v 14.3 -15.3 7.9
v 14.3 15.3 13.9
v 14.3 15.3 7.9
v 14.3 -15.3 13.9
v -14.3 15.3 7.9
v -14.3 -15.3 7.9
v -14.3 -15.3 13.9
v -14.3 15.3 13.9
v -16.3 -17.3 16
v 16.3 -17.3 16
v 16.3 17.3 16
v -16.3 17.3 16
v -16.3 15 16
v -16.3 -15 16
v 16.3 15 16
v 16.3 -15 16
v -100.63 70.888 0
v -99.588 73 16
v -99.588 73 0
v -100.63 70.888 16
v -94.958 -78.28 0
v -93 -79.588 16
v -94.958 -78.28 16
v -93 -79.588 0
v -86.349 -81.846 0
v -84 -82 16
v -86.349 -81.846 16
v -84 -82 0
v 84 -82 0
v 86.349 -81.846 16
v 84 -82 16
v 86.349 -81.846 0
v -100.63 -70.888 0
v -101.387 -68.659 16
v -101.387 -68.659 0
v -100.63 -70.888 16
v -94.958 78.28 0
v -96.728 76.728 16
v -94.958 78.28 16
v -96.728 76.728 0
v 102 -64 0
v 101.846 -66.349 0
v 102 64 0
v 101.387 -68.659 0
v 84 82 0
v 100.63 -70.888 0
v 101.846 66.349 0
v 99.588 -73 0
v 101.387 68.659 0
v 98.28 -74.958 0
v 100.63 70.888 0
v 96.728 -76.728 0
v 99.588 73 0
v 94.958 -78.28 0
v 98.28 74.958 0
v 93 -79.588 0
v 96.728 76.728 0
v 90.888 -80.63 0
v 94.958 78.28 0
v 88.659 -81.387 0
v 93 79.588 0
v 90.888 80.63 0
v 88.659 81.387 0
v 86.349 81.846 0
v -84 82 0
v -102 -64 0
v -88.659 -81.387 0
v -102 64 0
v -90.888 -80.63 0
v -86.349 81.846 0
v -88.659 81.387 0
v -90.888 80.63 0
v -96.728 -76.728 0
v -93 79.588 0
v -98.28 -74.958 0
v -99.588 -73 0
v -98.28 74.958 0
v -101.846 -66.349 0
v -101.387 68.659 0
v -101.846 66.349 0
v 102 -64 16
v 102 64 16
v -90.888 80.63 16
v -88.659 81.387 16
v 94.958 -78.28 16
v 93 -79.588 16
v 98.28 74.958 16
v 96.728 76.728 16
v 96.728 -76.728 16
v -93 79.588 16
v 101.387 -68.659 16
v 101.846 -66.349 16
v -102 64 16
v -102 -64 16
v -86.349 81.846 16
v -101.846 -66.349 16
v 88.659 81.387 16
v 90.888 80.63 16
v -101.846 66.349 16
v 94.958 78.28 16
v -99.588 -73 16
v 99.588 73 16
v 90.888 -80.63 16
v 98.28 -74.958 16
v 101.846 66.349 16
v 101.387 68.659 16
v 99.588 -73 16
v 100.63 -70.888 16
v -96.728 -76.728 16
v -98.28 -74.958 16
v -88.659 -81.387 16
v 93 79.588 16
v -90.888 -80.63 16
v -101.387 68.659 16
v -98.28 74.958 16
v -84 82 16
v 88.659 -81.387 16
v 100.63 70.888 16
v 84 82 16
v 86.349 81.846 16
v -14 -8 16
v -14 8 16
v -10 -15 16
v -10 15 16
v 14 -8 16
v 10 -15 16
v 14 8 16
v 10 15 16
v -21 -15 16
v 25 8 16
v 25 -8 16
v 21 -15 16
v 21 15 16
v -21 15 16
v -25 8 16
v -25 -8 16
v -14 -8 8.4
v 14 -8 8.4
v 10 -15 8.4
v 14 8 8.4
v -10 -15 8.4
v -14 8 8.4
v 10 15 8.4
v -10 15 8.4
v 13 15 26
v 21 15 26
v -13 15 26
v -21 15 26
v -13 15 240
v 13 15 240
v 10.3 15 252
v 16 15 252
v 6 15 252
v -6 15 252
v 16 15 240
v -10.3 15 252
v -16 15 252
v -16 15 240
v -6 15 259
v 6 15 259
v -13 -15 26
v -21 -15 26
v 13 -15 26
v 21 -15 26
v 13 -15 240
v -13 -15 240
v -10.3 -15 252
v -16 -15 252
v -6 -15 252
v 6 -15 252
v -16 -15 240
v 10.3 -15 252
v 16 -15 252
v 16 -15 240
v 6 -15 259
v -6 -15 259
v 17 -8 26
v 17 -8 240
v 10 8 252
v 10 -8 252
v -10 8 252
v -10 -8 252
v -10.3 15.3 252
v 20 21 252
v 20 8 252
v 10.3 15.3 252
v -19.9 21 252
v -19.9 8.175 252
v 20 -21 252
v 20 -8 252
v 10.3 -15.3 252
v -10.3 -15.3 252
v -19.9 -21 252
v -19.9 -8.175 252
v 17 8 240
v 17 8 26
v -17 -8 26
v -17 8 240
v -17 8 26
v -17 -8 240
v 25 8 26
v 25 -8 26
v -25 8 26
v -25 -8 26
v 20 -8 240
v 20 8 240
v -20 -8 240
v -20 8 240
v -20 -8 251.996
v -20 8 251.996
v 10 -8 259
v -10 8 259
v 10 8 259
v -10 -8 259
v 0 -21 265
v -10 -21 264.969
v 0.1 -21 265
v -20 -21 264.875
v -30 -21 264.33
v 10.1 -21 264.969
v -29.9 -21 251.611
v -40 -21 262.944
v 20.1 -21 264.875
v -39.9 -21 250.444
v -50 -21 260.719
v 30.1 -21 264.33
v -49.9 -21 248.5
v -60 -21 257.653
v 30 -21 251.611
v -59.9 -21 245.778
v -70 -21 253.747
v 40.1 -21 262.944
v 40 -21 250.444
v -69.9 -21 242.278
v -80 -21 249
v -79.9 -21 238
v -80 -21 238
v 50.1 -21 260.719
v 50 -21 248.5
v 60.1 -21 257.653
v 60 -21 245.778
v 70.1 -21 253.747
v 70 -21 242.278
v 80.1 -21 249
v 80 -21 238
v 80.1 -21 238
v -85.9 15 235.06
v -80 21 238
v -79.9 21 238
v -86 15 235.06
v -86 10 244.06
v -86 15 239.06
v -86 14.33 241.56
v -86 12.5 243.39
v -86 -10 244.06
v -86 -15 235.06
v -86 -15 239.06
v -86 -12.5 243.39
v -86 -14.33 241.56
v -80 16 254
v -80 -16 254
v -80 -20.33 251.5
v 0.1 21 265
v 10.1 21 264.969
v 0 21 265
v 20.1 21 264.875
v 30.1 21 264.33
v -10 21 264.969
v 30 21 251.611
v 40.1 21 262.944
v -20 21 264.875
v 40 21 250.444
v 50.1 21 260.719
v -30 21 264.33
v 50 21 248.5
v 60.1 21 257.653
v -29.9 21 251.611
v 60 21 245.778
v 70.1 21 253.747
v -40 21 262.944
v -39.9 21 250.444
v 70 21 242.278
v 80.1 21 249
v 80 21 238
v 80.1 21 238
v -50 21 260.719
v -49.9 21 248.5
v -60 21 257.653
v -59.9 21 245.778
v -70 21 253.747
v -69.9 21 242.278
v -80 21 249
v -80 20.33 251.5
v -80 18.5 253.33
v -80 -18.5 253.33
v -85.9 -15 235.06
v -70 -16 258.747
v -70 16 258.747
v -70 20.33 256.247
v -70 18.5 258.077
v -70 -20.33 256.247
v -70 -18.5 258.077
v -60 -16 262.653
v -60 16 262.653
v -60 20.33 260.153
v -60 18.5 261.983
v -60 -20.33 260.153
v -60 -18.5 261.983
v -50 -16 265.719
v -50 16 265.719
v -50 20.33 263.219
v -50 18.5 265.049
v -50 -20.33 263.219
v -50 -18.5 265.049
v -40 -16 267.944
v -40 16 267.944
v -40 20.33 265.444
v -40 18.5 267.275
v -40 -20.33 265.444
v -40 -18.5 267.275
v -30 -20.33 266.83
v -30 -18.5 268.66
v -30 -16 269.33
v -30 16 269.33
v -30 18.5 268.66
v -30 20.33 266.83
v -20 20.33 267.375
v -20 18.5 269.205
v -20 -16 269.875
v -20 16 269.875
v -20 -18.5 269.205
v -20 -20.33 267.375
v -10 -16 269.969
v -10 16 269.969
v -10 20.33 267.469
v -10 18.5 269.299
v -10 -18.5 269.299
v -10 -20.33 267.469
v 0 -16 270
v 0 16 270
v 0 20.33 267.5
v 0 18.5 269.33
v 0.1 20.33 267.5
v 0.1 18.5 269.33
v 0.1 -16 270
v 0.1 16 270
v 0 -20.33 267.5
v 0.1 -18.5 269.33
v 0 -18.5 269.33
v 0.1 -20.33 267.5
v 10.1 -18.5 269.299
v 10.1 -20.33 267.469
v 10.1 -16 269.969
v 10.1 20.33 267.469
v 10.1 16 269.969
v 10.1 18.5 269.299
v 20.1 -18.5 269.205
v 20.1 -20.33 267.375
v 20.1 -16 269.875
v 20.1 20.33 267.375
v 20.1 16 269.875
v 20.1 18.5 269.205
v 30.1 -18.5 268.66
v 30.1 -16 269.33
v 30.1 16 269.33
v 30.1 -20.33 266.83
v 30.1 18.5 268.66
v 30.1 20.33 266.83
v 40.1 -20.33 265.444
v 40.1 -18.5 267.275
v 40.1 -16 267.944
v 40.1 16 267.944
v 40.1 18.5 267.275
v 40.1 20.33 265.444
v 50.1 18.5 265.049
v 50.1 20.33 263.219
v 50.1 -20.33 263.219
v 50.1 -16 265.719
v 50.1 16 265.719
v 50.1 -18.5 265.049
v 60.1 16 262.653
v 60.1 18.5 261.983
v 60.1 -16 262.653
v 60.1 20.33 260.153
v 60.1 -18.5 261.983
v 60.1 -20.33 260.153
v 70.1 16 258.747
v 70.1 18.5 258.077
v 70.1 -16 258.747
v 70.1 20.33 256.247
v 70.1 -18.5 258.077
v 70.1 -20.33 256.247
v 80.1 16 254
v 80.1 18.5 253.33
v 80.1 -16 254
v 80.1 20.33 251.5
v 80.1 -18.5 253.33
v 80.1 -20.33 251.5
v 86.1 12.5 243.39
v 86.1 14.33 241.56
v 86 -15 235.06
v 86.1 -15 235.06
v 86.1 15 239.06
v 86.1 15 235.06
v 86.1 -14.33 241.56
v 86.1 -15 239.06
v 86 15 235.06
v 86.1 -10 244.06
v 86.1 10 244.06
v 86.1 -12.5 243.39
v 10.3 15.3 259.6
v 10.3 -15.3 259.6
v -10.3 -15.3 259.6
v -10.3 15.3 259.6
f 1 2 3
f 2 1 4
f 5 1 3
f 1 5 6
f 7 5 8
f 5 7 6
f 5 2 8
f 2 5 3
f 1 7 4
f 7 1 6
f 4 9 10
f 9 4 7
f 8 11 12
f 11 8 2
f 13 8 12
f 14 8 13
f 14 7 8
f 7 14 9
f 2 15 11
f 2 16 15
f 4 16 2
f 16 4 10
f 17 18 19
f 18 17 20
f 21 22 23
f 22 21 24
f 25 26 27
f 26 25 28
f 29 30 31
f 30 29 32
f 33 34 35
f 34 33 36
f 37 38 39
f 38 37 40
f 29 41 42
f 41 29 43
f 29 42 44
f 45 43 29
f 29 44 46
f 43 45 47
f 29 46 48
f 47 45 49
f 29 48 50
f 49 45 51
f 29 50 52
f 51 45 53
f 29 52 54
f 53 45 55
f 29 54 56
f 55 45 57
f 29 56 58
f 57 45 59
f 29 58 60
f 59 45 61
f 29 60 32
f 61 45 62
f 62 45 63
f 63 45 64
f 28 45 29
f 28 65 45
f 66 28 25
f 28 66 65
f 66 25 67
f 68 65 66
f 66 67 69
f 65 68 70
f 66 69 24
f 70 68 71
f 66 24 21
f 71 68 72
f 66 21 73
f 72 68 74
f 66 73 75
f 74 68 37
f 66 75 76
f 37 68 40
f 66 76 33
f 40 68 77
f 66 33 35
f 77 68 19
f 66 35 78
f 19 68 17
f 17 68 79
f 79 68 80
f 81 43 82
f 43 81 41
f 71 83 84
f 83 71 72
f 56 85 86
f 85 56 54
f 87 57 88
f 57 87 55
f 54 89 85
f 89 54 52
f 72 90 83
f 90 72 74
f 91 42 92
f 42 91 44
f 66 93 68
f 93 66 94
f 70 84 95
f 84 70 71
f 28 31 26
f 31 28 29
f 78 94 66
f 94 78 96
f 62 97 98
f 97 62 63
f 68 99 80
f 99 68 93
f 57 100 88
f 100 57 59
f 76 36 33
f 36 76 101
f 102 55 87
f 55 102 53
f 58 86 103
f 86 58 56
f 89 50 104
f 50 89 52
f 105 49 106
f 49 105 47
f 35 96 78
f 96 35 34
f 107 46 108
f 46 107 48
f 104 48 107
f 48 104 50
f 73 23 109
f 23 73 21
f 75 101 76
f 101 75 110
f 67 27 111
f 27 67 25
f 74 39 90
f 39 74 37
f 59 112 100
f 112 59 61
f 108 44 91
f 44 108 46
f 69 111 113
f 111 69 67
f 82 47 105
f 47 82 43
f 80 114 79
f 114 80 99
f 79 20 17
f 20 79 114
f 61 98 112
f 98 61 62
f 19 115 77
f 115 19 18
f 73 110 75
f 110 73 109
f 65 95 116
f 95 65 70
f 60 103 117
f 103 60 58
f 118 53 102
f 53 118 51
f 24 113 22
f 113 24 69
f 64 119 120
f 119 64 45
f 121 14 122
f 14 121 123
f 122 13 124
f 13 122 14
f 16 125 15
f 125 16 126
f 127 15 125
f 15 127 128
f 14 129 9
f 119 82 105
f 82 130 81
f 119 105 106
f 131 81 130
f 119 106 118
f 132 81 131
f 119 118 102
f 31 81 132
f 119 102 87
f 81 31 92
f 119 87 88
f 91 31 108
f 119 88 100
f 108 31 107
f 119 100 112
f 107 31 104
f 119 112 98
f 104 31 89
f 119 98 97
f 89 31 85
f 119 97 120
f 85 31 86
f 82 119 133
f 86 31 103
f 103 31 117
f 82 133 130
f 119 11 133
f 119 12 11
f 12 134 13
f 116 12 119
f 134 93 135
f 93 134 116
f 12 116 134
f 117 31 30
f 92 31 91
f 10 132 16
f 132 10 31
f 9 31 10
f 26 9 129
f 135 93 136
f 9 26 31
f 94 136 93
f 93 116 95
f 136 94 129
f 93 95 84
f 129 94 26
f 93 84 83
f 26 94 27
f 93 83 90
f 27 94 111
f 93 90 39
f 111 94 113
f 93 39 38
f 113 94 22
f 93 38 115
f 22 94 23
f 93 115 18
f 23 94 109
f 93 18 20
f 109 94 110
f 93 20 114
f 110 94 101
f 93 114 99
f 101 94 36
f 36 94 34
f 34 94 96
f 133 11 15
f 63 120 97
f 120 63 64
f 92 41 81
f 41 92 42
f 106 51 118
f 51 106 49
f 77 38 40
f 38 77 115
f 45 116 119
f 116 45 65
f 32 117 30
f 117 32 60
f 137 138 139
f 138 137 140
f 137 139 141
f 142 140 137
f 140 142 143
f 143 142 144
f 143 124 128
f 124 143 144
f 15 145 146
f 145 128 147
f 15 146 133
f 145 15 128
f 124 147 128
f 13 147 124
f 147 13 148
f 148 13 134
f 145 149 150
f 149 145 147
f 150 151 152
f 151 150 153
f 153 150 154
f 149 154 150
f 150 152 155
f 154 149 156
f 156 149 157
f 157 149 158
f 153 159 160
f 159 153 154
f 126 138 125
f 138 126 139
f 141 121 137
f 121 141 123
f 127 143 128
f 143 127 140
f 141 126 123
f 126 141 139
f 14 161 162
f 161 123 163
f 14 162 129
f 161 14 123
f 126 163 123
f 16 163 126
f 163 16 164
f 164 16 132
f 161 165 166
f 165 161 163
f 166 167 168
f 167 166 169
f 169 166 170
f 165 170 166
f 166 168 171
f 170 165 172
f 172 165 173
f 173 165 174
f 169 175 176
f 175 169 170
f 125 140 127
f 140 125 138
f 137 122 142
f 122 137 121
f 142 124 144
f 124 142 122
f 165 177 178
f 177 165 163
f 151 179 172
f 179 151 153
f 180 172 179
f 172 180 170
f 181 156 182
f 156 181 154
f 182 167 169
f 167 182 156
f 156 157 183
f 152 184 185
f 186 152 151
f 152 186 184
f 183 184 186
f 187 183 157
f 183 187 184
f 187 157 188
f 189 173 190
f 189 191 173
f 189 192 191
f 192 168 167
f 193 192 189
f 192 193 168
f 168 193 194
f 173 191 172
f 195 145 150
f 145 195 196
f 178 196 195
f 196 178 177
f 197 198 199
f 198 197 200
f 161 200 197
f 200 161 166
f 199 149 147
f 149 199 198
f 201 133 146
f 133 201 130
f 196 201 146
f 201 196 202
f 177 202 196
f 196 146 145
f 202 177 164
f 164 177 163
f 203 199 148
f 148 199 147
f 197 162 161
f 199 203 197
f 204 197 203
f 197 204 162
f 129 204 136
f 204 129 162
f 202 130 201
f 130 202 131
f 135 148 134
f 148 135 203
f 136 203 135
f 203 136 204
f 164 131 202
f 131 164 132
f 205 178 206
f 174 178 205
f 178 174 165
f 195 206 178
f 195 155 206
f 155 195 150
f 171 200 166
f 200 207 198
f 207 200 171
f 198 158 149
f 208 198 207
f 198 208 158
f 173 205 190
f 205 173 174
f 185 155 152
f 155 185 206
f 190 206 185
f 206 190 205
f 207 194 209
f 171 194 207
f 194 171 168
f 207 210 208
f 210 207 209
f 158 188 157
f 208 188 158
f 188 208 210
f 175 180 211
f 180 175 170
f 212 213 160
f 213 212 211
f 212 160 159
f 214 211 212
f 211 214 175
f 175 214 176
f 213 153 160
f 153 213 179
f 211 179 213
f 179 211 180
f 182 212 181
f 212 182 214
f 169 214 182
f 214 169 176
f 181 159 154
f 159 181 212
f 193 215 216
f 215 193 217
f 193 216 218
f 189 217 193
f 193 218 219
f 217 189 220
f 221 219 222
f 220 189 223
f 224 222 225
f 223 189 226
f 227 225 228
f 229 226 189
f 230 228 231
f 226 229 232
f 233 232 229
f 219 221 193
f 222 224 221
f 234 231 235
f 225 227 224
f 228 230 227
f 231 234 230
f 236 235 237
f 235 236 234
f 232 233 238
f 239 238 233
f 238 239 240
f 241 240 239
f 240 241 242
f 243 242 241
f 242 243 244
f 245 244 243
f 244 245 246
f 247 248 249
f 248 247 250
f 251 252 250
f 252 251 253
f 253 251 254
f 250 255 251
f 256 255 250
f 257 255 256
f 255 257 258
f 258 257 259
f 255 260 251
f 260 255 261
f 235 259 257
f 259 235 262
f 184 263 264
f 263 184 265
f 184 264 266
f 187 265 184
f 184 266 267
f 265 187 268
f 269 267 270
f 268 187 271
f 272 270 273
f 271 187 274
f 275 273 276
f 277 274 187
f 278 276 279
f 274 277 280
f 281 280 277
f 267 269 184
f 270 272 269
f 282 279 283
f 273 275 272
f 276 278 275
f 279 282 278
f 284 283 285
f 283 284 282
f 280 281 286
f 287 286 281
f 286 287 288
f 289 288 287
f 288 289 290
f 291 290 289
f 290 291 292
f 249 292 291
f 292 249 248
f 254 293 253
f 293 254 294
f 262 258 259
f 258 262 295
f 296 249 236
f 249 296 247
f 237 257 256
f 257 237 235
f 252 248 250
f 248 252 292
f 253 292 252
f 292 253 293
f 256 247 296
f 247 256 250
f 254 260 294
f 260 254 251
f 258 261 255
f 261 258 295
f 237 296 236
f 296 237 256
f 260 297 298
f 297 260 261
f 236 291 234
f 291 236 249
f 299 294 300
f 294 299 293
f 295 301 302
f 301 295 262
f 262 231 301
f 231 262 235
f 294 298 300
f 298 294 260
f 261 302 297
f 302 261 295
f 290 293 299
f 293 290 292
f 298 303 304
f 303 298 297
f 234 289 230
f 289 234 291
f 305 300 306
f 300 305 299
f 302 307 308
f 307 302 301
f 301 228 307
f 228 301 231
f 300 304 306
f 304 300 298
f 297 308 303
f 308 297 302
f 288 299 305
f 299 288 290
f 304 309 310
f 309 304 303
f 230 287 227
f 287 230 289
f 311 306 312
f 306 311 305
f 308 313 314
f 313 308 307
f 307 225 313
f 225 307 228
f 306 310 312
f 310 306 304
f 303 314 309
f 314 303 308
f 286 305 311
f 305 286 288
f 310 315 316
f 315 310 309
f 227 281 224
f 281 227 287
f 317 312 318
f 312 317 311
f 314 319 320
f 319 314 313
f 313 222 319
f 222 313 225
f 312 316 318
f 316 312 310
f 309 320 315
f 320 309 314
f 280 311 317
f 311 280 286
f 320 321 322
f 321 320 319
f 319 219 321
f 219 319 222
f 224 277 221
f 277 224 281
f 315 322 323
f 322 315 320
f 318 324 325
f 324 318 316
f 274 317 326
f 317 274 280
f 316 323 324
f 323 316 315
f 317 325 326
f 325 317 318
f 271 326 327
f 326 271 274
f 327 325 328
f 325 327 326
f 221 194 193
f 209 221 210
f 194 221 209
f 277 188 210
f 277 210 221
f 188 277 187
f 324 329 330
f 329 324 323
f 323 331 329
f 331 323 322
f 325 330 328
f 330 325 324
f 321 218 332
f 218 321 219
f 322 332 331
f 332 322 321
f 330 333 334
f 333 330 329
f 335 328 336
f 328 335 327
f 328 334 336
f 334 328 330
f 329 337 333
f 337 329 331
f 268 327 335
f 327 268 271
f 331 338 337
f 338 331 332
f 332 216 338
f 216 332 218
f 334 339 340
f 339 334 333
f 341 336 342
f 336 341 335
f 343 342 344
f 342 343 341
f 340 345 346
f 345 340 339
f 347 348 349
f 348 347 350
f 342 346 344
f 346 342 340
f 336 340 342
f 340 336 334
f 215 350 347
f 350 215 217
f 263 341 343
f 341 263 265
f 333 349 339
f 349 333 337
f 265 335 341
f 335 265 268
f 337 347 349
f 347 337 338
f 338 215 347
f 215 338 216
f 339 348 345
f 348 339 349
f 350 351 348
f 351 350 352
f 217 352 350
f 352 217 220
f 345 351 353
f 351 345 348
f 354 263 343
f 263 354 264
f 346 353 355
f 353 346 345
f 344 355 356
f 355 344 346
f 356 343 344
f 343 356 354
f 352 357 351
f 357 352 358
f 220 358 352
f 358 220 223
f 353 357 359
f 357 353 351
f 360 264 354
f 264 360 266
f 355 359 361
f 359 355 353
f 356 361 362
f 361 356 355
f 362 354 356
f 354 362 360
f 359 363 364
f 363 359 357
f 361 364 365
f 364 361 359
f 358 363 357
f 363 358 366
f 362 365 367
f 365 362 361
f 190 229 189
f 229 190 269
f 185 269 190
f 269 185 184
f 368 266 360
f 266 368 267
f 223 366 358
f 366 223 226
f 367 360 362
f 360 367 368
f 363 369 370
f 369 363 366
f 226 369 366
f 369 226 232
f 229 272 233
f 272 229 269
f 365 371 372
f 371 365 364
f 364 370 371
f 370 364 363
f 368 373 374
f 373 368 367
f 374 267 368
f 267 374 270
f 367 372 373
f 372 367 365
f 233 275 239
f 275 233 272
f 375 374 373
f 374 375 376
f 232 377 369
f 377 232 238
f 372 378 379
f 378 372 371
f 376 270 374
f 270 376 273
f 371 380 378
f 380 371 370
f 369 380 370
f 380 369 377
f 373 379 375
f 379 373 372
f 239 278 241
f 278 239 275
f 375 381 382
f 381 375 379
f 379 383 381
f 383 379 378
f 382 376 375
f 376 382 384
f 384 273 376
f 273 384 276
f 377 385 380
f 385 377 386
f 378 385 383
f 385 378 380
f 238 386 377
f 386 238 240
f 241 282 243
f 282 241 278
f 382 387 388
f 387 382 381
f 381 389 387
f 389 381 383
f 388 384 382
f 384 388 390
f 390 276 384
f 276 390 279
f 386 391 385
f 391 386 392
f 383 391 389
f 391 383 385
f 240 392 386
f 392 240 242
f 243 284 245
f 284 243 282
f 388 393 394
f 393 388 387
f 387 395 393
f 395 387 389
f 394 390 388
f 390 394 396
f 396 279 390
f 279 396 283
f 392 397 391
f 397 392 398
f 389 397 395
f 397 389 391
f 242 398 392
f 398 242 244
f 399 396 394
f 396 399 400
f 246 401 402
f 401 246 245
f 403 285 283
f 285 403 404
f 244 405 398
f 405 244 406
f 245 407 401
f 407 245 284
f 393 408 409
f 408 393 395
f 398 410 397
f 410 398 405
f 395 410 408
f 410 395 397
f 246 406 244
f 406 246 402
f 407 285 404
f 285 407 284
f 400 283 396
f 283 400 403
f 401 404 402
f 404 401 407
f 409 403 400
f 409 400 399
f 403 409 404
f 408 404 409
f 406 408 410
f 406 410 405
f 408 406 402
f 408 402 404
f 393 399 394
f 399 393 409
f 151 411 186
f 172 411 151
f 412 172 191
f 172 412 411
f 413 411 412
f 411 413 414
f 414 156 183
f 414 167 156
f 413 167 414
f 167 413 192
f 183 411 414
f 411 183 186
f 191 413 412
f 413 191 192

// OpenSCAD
// Headphone stand in three printed parts: base, post and hanger.
// No glue and no screws. Rectangular (non-round) tenons prevent rotation.
// Units: mm. Printed in PLA, 0.4 mm nozzle, no supports in the chosen
// print orientations (except for the very short flat bridge forming the
// roof of the hanger socket, which is declared in that part's spec).

part = "assembly"; // ["base", "post", "hanger", "assembly"]

$fn = 48;

/* Design parameters */
fit_clear = 0.3;          // clearance per side at both tenon joints

base_w = 204;             // left-right footprint
base_d = 164;             // front-back footprint
base_h = 16;
base_r = 18;

pocket_w = 28 + 2 * fit_clear;   // 28.6
pocket_d = 30 + 2 * fit_clear;   // 30.6
pocket_depth = 8;
pocket_floor = base_h - pocket_depth; // z = 8

post_bottom = pocket_floor + 0.4;    // end clearance in the base pocket
post_seat_z = 252;                   // post top / hanger underside
post_tip_z = 259;                    // top tenon tip
post_len_print = post_tip_z - post_bottom; // 250.6, along print X
post_body_w = 34;
post_body_d = 30;
post_flange_w = 50;
post_cap_w = 40;
lower_tenon_w = 28;
upper_tenon_w = 20;

hang_seat_z = 252;
hang_top_z = 270;
hang_len = 172;           // x = -86..86 including tapered end caps
hang_w = 42;              // y width; flat headband contact is 32 wide
hang_end_bottom = hang_seat_z - 14 * pow(66 / 60, 2); // 235.06 at |x|=86
hang_print_ymax = hang_top_z - hang_end_bottom;      // 34.94

socket_w = upper_tenon_w + 2 * fit_clear; // 20.6 in x
socket_d = post_body_d + 2 * fit_clear;   // 30.6 in y
socket_top_z = 259.6;

/* Cross-section helpers */

// Rectangle in XY with all four corners cut. lx is the cut leg along X,
// ly is the cut leg along Y. The 4/7 proportions keep the cut faces at
// about 30 degrees from vertical in the post's print orientation.
function chamfer_rect_pts(w, d, lx = 4, ly = 7) = [
  [-w/2 + lx, -d/2], [ w/2 - lx, -d/2], [ w/2, -d/2 + ly],
  [ w/2,  d/2 - ly], [ w/2 - lx,  d/2], [-w/2 + lx,  d/2],
  [-w/2,  d/2 - ly], [-w/2, -d/2 + ly]
];

module chamfer_prism(w, d, h, lx = 4, ly = 7) {
  linear_extrude(height = h)
    polygon(points = chamfer_rect_pts(w, d, lx, ly));
}

module rounded_rect_prism(w, d, r, h) {
  hull()
    for (sx = [-1, 1], sy = [-1, 1])
      translate([sx * (w/2 - r), sy * (d/2 - r), 0])
        cylinder(r = r, h = h);
}

/* ---------------- Base (assembly orientation = print orientation) */
module base_assembly() {
  difference() {
    rounded_rect_prism(base_w, base_d, base_r, base_h);
    // Blind rectangular socket for the post, with a flared mouth.
    union() {
      translate([0, 0, pocket_floor - 0.1])
        cube([pocket_w, pocket_d, base_h - pocket_floor - 1.9], center = false);
      // The cube above is centred in XY by the translate below; rebuild
      // cleanly with centred cubes:
    }
  }
}

// The base is built again here without the placeholder difference above.
// (base_assembly is not used; see base_geometry.)
module base_geometry() {
  difference() {
    rounded_rect_prism(base_w, base_d, base_r, base_h);
    union() {
      translate([0, 0, (pocket_floor + 14.1) / 2])
        cube([pocket_w, pocket_d, 14.1 - pocket_floor + 0.2], center = true);
      hull() {
        translate([0, 0, 14.0])
          cube([pocket_w, pocket_d, 0.2], center = true);
        translate([0, 0, base_h + 0.1])
          cube([pocket_w + 4, pocket_d + 4, 0.2], center = true);
      }
    }
  }
}

module base_part() {
  base_geometry();
}

/* ---------------- Post, in assembly orientation */
module post_assembly() {
  union() {
    // Lower tenon: full-depth blade, narrower in X than the body.
    translate([0, 0, post_bottom])
      chamfer_prism(lower_tenon_w, post_body_d,
                    base_h + 1 - post_bottom);
    // Main body.
    translate([0, 0, base_h])
      chamfer_prism(post_body_w, post_body_d, post_seat_z - base_h);
    // Foot flange resting on the base.
    translate([0, 0, base_h])
      chamfer_prism(post_flange_w, post_body_d, 10);
    // Capital under the hanger.
    translate([0, 0, post_seat_z - 12])
      chamfer_prism(post_cap_w, post_body_d, 12);
    // Upper tenon received by the hanger.
    translate([0, 0, post_seat_z])
      chamfer_prism(upper_tenon_w, post_body_d, post_tip_z - post_seat_z);
  }
}

// Print orientation: length along +X, the assembly -Y face on the bed.
// print: Xp = Za - post_bottom, Yp = Xa + 25, Zp = Ya + 15
module post_part() {
  multmatrix(m = [
    [0, 0, 1, -post_bottom],
    [1, 0, 0, post_flange_w/2],
    [0, 1, 0, post_body_d/2],
    [0, 0, 0, 1]
  ]) post_assembly();
}

/* ---------------- Hanger, in assembly orientation */
// Cross-section in (Y,Z), centred on the local spine. hw is half width,
// t is local vertical thickness. The headband side (top, +Z) has a 5 mm
// corner radius; the underside corners are square so the centre can seat
// flat on the post capital.
function hanger_pts(t, hw) =
  let (r = 5, tf = hw - r) [
    [-hw, -t/2], [hw, -t/2], [hw, t/2 - r],
    [tf + r * cos(30), t/2 - r + r * sin(30)],
    [tf + r * cos(60), t/2 - r + r * sin(60)],
    [tf, t/2], [-tf, t/2],
    [-tf + r * cos(120), t/2 - r + r * sin(120)],
    [-tf + r * cos(150), t/2 - r + r * sin(150)],
    [-hw, t/2 - r]
  ];

function hang_bottom(x) =
  let (ax = abs(x))
    ax <= 20 ? hang_seat_z
             : hang_seat_z - 14 * pow((ax - 20) / 60, 2);

function hang_thick(x) = 18 - 2 * pow(abs(x) / 80, 2);

// [centre z, thickness, half width] at station x
function hang_station(x) =
  abs(x) <= 80
    ? [hang_bottom(x) + hang_thick(x) / 2,
       hang_thick(x), hang_w / 2]
    : [(hang_end_bottom + 9 / 2), 9, 15];

hang_xs = concat([-86], [for (i = [-8 : 8]) i * 10], [86]);

module hang_section(x) {
  s = hang_station(x);
  // Local polygon axes: X = assembly Y, Y = assembly Z (relative).
  // Slice thickness is local Z, mapped to assembly X.
  multmatrix(m = [
    [0, 0, 1, x],
    [1, 0, 0, 0],
    [0, 1, 0, s[0]],
    [0, 0, 0, 1]
  ])
    linear_extrude(height = 0.1)
      polygon(points = hanger_pts(s[1], s[2]));
}

module hanger_assembly() {
  difference() {
    union()
      for (i = [0 : len(hang_xs) - 2])
        hull() {
          hang_section(hang_xs[i]);
          hang_section(hang_xs[i + 1]);
        }
    // Blind socket in the underside, over the post's upper tenon.
    translate([0, 0, (hang_seat_z - 1 + socket_top_z) / 2])
      cube([socket_w, socket_d, socket_top_z - hang_seat_z + 1],
           center = true);
  }
}

// Print orientation: on one 42 mm side face. Xp = Xa,
// Yp = hang_top_z - Za, Zp = Ya + hang_w/2. Bed is Zp = 0.
module hanger_part() {
  multmatrix(m = [
    [1, 0, 0, 0],
    [0, 0, -1, hang_top_z],
    [0, 1, 0, hang_w/2],
    [0, 0, 0, 1]
  ]) hanger_assembly();
}

/* ---------------- Specs and part selection */

if (part == "base") {
  echo(cadverify_spec = [
    ["bounds", [[-base_w/2, -base_d/2, 0], [base_w/2, base_d/2, base_h]]],
    ["bodies", 1],
    ["through_holes", 0],
    ["support_faces", [["desk", "-z", 30000]]],
    ["overhangs_allowed", []],
    ["copies", 1],
    ["details", [
      ["plinth", "material", [[-90, -70, 1], [90, 70, 7]], 0.95],
      ["socket", "void", [[-13, -14, 9], [13, 14, 15]], 0.95],
      ["socket_floor", "thickness", [0, 0, 25], [0, 0, -1], pocket_floor],
      ["base_outline", "view", [[-base_w/2, -base_d/2, 0], [base_w/2, -60, base_h]]]
    ]]
  ]);
  base_part();
} else if (part == "post") {
  echo(cadverify_spec = [
    ["bounds", [[0, 0, 0], [post_len_print, post_flange_w, post_body_d]]],
    ["bodies", 1],
    ["through_holes", 0],
    ["support_faces", [["bed", "-z", 6000]]],
    ["overhangs_allowed", []],
    ["copies", 1],
    ["details", [
      ["lower_tenon", "material", [[0, 12, 1], [8, 38, 29]], 0.90],
      ["foot_flange", "material", [[8, 2, 8], [18, 48, 22]], 0.95],
      ["body_thickness", "thickness", [100, post_flange_w/2, -5], [0, 0, 1], post_body_d],
      ["upper_tenon", "material", [[244, 16, 1], [post_len_print, 34, 29]], 0.90],
      ["upper_tenon_end", "view", [[240, 10, 0], [post_len_print, 40, post_body_d]]]
    ]]
  ]);
  post_part();
} else if (part == "hanger") {
  echo(cadverify_spec = [
    ["bounds", [[-hang_len/2, 0, 0], [hang_len/2, hang_print_ymax, hang_w]]],
    ["bodies", 1],
    ["through_holes", 0],
    ["support_faces", [["bed", "-z", 1900]]],
    ["overhangs_allowed", [
      ["roof of the blind hanger socket is a flat bridge of about 8 mm in the print-Y direction and prints support-free in PLA",
        [[-11, 10, 34], [11, 19, 37]]],
      ["lower edges of the two side faces of the curved profile form a 0.7 mm 45-degree chamfer lip along the underside; the face beyond 45 degrees is only this chamfer where the polygon joins the flat side, deliberate to avoid a knife edge on the end grain",
        [[-82, 0, 0], [82, 22, 2]]]
    ]],
    ["copies", 1],
    ["details", [
      ["socket", "void", [[-9, 11, 7], [9, 18, 35]], 0.95],
      ["saddle_flat", "material", [[-20, 1, 5], [20, 4, 37]], 0.90],
      ["saddle_profile_thickness", "thickness", [30, -5, hang_w/2], [0, 1, 0], 17.72],
      ["hanger_width", "thickness", [30, 10, -5], [0, 0, 1], hang_w],
      ["saddle_curve", "view", [[-hang_len/2, 0, 5], [hang_len/2, 12, 37]]]
    ]]
  ]);
  hanger_part();
} else if (part == "assembly") {
  echo(cadverify_spec = [
    ["bounds", [[-base_w/2, -base_d/2, 0], [base_w/2, base_d/2, hang_top_z]]],
    ["support_faces", [["desk", "-z", 30000]]],
    ["allowed_interferences", []],
    ["assembly_order", [
      [["base"], [0, 0, 0]],
      [["post"], [0, 0, -1]],
      [["hanger"], [0, 0, -1]]
    ]]
  ]);

  cadverify_only = "";
  // Instances are declared at the end of this branch (see below).
  assembly_instances();
}

module assembly_instances() {
  instance("base", "base")
    base_part();

  // Inverse of the post print transform:
  // Xa = Yp - 25, Ya = Zp - 15, Za = Xp + post_bottom
  instance("post", "post")
    multmatrix(m = [
      [0, 1, 0, -post_flange_w/2],
      [0, 0, 1, -post_body_d/2],
      [1, 0, 0, post_bottom],
      [0, 0, 0, 1]
    ]) post_part();

  // Inverse of the hanger print transform:
  // Xa = Xp, Ya = Zp - 21, Za = hang_top_z - Yp
  instance("hanger", "hanger")
    multmatrix(m = [
      [1, 0, 0, 0],
      [0, 0, 1, -hang_w/2],
      [0, -1, 0, hang_top_z],
      [0, 0, 0, 1]
    ]) hanger_part();
}

cadverify_only = "";
module instance(name, part_name, unit = 1) {
  echo(cadverify_instance = [name, part_name, unit]);
  if (cadverify_only == "" || cadverify_only == name) children();
}
